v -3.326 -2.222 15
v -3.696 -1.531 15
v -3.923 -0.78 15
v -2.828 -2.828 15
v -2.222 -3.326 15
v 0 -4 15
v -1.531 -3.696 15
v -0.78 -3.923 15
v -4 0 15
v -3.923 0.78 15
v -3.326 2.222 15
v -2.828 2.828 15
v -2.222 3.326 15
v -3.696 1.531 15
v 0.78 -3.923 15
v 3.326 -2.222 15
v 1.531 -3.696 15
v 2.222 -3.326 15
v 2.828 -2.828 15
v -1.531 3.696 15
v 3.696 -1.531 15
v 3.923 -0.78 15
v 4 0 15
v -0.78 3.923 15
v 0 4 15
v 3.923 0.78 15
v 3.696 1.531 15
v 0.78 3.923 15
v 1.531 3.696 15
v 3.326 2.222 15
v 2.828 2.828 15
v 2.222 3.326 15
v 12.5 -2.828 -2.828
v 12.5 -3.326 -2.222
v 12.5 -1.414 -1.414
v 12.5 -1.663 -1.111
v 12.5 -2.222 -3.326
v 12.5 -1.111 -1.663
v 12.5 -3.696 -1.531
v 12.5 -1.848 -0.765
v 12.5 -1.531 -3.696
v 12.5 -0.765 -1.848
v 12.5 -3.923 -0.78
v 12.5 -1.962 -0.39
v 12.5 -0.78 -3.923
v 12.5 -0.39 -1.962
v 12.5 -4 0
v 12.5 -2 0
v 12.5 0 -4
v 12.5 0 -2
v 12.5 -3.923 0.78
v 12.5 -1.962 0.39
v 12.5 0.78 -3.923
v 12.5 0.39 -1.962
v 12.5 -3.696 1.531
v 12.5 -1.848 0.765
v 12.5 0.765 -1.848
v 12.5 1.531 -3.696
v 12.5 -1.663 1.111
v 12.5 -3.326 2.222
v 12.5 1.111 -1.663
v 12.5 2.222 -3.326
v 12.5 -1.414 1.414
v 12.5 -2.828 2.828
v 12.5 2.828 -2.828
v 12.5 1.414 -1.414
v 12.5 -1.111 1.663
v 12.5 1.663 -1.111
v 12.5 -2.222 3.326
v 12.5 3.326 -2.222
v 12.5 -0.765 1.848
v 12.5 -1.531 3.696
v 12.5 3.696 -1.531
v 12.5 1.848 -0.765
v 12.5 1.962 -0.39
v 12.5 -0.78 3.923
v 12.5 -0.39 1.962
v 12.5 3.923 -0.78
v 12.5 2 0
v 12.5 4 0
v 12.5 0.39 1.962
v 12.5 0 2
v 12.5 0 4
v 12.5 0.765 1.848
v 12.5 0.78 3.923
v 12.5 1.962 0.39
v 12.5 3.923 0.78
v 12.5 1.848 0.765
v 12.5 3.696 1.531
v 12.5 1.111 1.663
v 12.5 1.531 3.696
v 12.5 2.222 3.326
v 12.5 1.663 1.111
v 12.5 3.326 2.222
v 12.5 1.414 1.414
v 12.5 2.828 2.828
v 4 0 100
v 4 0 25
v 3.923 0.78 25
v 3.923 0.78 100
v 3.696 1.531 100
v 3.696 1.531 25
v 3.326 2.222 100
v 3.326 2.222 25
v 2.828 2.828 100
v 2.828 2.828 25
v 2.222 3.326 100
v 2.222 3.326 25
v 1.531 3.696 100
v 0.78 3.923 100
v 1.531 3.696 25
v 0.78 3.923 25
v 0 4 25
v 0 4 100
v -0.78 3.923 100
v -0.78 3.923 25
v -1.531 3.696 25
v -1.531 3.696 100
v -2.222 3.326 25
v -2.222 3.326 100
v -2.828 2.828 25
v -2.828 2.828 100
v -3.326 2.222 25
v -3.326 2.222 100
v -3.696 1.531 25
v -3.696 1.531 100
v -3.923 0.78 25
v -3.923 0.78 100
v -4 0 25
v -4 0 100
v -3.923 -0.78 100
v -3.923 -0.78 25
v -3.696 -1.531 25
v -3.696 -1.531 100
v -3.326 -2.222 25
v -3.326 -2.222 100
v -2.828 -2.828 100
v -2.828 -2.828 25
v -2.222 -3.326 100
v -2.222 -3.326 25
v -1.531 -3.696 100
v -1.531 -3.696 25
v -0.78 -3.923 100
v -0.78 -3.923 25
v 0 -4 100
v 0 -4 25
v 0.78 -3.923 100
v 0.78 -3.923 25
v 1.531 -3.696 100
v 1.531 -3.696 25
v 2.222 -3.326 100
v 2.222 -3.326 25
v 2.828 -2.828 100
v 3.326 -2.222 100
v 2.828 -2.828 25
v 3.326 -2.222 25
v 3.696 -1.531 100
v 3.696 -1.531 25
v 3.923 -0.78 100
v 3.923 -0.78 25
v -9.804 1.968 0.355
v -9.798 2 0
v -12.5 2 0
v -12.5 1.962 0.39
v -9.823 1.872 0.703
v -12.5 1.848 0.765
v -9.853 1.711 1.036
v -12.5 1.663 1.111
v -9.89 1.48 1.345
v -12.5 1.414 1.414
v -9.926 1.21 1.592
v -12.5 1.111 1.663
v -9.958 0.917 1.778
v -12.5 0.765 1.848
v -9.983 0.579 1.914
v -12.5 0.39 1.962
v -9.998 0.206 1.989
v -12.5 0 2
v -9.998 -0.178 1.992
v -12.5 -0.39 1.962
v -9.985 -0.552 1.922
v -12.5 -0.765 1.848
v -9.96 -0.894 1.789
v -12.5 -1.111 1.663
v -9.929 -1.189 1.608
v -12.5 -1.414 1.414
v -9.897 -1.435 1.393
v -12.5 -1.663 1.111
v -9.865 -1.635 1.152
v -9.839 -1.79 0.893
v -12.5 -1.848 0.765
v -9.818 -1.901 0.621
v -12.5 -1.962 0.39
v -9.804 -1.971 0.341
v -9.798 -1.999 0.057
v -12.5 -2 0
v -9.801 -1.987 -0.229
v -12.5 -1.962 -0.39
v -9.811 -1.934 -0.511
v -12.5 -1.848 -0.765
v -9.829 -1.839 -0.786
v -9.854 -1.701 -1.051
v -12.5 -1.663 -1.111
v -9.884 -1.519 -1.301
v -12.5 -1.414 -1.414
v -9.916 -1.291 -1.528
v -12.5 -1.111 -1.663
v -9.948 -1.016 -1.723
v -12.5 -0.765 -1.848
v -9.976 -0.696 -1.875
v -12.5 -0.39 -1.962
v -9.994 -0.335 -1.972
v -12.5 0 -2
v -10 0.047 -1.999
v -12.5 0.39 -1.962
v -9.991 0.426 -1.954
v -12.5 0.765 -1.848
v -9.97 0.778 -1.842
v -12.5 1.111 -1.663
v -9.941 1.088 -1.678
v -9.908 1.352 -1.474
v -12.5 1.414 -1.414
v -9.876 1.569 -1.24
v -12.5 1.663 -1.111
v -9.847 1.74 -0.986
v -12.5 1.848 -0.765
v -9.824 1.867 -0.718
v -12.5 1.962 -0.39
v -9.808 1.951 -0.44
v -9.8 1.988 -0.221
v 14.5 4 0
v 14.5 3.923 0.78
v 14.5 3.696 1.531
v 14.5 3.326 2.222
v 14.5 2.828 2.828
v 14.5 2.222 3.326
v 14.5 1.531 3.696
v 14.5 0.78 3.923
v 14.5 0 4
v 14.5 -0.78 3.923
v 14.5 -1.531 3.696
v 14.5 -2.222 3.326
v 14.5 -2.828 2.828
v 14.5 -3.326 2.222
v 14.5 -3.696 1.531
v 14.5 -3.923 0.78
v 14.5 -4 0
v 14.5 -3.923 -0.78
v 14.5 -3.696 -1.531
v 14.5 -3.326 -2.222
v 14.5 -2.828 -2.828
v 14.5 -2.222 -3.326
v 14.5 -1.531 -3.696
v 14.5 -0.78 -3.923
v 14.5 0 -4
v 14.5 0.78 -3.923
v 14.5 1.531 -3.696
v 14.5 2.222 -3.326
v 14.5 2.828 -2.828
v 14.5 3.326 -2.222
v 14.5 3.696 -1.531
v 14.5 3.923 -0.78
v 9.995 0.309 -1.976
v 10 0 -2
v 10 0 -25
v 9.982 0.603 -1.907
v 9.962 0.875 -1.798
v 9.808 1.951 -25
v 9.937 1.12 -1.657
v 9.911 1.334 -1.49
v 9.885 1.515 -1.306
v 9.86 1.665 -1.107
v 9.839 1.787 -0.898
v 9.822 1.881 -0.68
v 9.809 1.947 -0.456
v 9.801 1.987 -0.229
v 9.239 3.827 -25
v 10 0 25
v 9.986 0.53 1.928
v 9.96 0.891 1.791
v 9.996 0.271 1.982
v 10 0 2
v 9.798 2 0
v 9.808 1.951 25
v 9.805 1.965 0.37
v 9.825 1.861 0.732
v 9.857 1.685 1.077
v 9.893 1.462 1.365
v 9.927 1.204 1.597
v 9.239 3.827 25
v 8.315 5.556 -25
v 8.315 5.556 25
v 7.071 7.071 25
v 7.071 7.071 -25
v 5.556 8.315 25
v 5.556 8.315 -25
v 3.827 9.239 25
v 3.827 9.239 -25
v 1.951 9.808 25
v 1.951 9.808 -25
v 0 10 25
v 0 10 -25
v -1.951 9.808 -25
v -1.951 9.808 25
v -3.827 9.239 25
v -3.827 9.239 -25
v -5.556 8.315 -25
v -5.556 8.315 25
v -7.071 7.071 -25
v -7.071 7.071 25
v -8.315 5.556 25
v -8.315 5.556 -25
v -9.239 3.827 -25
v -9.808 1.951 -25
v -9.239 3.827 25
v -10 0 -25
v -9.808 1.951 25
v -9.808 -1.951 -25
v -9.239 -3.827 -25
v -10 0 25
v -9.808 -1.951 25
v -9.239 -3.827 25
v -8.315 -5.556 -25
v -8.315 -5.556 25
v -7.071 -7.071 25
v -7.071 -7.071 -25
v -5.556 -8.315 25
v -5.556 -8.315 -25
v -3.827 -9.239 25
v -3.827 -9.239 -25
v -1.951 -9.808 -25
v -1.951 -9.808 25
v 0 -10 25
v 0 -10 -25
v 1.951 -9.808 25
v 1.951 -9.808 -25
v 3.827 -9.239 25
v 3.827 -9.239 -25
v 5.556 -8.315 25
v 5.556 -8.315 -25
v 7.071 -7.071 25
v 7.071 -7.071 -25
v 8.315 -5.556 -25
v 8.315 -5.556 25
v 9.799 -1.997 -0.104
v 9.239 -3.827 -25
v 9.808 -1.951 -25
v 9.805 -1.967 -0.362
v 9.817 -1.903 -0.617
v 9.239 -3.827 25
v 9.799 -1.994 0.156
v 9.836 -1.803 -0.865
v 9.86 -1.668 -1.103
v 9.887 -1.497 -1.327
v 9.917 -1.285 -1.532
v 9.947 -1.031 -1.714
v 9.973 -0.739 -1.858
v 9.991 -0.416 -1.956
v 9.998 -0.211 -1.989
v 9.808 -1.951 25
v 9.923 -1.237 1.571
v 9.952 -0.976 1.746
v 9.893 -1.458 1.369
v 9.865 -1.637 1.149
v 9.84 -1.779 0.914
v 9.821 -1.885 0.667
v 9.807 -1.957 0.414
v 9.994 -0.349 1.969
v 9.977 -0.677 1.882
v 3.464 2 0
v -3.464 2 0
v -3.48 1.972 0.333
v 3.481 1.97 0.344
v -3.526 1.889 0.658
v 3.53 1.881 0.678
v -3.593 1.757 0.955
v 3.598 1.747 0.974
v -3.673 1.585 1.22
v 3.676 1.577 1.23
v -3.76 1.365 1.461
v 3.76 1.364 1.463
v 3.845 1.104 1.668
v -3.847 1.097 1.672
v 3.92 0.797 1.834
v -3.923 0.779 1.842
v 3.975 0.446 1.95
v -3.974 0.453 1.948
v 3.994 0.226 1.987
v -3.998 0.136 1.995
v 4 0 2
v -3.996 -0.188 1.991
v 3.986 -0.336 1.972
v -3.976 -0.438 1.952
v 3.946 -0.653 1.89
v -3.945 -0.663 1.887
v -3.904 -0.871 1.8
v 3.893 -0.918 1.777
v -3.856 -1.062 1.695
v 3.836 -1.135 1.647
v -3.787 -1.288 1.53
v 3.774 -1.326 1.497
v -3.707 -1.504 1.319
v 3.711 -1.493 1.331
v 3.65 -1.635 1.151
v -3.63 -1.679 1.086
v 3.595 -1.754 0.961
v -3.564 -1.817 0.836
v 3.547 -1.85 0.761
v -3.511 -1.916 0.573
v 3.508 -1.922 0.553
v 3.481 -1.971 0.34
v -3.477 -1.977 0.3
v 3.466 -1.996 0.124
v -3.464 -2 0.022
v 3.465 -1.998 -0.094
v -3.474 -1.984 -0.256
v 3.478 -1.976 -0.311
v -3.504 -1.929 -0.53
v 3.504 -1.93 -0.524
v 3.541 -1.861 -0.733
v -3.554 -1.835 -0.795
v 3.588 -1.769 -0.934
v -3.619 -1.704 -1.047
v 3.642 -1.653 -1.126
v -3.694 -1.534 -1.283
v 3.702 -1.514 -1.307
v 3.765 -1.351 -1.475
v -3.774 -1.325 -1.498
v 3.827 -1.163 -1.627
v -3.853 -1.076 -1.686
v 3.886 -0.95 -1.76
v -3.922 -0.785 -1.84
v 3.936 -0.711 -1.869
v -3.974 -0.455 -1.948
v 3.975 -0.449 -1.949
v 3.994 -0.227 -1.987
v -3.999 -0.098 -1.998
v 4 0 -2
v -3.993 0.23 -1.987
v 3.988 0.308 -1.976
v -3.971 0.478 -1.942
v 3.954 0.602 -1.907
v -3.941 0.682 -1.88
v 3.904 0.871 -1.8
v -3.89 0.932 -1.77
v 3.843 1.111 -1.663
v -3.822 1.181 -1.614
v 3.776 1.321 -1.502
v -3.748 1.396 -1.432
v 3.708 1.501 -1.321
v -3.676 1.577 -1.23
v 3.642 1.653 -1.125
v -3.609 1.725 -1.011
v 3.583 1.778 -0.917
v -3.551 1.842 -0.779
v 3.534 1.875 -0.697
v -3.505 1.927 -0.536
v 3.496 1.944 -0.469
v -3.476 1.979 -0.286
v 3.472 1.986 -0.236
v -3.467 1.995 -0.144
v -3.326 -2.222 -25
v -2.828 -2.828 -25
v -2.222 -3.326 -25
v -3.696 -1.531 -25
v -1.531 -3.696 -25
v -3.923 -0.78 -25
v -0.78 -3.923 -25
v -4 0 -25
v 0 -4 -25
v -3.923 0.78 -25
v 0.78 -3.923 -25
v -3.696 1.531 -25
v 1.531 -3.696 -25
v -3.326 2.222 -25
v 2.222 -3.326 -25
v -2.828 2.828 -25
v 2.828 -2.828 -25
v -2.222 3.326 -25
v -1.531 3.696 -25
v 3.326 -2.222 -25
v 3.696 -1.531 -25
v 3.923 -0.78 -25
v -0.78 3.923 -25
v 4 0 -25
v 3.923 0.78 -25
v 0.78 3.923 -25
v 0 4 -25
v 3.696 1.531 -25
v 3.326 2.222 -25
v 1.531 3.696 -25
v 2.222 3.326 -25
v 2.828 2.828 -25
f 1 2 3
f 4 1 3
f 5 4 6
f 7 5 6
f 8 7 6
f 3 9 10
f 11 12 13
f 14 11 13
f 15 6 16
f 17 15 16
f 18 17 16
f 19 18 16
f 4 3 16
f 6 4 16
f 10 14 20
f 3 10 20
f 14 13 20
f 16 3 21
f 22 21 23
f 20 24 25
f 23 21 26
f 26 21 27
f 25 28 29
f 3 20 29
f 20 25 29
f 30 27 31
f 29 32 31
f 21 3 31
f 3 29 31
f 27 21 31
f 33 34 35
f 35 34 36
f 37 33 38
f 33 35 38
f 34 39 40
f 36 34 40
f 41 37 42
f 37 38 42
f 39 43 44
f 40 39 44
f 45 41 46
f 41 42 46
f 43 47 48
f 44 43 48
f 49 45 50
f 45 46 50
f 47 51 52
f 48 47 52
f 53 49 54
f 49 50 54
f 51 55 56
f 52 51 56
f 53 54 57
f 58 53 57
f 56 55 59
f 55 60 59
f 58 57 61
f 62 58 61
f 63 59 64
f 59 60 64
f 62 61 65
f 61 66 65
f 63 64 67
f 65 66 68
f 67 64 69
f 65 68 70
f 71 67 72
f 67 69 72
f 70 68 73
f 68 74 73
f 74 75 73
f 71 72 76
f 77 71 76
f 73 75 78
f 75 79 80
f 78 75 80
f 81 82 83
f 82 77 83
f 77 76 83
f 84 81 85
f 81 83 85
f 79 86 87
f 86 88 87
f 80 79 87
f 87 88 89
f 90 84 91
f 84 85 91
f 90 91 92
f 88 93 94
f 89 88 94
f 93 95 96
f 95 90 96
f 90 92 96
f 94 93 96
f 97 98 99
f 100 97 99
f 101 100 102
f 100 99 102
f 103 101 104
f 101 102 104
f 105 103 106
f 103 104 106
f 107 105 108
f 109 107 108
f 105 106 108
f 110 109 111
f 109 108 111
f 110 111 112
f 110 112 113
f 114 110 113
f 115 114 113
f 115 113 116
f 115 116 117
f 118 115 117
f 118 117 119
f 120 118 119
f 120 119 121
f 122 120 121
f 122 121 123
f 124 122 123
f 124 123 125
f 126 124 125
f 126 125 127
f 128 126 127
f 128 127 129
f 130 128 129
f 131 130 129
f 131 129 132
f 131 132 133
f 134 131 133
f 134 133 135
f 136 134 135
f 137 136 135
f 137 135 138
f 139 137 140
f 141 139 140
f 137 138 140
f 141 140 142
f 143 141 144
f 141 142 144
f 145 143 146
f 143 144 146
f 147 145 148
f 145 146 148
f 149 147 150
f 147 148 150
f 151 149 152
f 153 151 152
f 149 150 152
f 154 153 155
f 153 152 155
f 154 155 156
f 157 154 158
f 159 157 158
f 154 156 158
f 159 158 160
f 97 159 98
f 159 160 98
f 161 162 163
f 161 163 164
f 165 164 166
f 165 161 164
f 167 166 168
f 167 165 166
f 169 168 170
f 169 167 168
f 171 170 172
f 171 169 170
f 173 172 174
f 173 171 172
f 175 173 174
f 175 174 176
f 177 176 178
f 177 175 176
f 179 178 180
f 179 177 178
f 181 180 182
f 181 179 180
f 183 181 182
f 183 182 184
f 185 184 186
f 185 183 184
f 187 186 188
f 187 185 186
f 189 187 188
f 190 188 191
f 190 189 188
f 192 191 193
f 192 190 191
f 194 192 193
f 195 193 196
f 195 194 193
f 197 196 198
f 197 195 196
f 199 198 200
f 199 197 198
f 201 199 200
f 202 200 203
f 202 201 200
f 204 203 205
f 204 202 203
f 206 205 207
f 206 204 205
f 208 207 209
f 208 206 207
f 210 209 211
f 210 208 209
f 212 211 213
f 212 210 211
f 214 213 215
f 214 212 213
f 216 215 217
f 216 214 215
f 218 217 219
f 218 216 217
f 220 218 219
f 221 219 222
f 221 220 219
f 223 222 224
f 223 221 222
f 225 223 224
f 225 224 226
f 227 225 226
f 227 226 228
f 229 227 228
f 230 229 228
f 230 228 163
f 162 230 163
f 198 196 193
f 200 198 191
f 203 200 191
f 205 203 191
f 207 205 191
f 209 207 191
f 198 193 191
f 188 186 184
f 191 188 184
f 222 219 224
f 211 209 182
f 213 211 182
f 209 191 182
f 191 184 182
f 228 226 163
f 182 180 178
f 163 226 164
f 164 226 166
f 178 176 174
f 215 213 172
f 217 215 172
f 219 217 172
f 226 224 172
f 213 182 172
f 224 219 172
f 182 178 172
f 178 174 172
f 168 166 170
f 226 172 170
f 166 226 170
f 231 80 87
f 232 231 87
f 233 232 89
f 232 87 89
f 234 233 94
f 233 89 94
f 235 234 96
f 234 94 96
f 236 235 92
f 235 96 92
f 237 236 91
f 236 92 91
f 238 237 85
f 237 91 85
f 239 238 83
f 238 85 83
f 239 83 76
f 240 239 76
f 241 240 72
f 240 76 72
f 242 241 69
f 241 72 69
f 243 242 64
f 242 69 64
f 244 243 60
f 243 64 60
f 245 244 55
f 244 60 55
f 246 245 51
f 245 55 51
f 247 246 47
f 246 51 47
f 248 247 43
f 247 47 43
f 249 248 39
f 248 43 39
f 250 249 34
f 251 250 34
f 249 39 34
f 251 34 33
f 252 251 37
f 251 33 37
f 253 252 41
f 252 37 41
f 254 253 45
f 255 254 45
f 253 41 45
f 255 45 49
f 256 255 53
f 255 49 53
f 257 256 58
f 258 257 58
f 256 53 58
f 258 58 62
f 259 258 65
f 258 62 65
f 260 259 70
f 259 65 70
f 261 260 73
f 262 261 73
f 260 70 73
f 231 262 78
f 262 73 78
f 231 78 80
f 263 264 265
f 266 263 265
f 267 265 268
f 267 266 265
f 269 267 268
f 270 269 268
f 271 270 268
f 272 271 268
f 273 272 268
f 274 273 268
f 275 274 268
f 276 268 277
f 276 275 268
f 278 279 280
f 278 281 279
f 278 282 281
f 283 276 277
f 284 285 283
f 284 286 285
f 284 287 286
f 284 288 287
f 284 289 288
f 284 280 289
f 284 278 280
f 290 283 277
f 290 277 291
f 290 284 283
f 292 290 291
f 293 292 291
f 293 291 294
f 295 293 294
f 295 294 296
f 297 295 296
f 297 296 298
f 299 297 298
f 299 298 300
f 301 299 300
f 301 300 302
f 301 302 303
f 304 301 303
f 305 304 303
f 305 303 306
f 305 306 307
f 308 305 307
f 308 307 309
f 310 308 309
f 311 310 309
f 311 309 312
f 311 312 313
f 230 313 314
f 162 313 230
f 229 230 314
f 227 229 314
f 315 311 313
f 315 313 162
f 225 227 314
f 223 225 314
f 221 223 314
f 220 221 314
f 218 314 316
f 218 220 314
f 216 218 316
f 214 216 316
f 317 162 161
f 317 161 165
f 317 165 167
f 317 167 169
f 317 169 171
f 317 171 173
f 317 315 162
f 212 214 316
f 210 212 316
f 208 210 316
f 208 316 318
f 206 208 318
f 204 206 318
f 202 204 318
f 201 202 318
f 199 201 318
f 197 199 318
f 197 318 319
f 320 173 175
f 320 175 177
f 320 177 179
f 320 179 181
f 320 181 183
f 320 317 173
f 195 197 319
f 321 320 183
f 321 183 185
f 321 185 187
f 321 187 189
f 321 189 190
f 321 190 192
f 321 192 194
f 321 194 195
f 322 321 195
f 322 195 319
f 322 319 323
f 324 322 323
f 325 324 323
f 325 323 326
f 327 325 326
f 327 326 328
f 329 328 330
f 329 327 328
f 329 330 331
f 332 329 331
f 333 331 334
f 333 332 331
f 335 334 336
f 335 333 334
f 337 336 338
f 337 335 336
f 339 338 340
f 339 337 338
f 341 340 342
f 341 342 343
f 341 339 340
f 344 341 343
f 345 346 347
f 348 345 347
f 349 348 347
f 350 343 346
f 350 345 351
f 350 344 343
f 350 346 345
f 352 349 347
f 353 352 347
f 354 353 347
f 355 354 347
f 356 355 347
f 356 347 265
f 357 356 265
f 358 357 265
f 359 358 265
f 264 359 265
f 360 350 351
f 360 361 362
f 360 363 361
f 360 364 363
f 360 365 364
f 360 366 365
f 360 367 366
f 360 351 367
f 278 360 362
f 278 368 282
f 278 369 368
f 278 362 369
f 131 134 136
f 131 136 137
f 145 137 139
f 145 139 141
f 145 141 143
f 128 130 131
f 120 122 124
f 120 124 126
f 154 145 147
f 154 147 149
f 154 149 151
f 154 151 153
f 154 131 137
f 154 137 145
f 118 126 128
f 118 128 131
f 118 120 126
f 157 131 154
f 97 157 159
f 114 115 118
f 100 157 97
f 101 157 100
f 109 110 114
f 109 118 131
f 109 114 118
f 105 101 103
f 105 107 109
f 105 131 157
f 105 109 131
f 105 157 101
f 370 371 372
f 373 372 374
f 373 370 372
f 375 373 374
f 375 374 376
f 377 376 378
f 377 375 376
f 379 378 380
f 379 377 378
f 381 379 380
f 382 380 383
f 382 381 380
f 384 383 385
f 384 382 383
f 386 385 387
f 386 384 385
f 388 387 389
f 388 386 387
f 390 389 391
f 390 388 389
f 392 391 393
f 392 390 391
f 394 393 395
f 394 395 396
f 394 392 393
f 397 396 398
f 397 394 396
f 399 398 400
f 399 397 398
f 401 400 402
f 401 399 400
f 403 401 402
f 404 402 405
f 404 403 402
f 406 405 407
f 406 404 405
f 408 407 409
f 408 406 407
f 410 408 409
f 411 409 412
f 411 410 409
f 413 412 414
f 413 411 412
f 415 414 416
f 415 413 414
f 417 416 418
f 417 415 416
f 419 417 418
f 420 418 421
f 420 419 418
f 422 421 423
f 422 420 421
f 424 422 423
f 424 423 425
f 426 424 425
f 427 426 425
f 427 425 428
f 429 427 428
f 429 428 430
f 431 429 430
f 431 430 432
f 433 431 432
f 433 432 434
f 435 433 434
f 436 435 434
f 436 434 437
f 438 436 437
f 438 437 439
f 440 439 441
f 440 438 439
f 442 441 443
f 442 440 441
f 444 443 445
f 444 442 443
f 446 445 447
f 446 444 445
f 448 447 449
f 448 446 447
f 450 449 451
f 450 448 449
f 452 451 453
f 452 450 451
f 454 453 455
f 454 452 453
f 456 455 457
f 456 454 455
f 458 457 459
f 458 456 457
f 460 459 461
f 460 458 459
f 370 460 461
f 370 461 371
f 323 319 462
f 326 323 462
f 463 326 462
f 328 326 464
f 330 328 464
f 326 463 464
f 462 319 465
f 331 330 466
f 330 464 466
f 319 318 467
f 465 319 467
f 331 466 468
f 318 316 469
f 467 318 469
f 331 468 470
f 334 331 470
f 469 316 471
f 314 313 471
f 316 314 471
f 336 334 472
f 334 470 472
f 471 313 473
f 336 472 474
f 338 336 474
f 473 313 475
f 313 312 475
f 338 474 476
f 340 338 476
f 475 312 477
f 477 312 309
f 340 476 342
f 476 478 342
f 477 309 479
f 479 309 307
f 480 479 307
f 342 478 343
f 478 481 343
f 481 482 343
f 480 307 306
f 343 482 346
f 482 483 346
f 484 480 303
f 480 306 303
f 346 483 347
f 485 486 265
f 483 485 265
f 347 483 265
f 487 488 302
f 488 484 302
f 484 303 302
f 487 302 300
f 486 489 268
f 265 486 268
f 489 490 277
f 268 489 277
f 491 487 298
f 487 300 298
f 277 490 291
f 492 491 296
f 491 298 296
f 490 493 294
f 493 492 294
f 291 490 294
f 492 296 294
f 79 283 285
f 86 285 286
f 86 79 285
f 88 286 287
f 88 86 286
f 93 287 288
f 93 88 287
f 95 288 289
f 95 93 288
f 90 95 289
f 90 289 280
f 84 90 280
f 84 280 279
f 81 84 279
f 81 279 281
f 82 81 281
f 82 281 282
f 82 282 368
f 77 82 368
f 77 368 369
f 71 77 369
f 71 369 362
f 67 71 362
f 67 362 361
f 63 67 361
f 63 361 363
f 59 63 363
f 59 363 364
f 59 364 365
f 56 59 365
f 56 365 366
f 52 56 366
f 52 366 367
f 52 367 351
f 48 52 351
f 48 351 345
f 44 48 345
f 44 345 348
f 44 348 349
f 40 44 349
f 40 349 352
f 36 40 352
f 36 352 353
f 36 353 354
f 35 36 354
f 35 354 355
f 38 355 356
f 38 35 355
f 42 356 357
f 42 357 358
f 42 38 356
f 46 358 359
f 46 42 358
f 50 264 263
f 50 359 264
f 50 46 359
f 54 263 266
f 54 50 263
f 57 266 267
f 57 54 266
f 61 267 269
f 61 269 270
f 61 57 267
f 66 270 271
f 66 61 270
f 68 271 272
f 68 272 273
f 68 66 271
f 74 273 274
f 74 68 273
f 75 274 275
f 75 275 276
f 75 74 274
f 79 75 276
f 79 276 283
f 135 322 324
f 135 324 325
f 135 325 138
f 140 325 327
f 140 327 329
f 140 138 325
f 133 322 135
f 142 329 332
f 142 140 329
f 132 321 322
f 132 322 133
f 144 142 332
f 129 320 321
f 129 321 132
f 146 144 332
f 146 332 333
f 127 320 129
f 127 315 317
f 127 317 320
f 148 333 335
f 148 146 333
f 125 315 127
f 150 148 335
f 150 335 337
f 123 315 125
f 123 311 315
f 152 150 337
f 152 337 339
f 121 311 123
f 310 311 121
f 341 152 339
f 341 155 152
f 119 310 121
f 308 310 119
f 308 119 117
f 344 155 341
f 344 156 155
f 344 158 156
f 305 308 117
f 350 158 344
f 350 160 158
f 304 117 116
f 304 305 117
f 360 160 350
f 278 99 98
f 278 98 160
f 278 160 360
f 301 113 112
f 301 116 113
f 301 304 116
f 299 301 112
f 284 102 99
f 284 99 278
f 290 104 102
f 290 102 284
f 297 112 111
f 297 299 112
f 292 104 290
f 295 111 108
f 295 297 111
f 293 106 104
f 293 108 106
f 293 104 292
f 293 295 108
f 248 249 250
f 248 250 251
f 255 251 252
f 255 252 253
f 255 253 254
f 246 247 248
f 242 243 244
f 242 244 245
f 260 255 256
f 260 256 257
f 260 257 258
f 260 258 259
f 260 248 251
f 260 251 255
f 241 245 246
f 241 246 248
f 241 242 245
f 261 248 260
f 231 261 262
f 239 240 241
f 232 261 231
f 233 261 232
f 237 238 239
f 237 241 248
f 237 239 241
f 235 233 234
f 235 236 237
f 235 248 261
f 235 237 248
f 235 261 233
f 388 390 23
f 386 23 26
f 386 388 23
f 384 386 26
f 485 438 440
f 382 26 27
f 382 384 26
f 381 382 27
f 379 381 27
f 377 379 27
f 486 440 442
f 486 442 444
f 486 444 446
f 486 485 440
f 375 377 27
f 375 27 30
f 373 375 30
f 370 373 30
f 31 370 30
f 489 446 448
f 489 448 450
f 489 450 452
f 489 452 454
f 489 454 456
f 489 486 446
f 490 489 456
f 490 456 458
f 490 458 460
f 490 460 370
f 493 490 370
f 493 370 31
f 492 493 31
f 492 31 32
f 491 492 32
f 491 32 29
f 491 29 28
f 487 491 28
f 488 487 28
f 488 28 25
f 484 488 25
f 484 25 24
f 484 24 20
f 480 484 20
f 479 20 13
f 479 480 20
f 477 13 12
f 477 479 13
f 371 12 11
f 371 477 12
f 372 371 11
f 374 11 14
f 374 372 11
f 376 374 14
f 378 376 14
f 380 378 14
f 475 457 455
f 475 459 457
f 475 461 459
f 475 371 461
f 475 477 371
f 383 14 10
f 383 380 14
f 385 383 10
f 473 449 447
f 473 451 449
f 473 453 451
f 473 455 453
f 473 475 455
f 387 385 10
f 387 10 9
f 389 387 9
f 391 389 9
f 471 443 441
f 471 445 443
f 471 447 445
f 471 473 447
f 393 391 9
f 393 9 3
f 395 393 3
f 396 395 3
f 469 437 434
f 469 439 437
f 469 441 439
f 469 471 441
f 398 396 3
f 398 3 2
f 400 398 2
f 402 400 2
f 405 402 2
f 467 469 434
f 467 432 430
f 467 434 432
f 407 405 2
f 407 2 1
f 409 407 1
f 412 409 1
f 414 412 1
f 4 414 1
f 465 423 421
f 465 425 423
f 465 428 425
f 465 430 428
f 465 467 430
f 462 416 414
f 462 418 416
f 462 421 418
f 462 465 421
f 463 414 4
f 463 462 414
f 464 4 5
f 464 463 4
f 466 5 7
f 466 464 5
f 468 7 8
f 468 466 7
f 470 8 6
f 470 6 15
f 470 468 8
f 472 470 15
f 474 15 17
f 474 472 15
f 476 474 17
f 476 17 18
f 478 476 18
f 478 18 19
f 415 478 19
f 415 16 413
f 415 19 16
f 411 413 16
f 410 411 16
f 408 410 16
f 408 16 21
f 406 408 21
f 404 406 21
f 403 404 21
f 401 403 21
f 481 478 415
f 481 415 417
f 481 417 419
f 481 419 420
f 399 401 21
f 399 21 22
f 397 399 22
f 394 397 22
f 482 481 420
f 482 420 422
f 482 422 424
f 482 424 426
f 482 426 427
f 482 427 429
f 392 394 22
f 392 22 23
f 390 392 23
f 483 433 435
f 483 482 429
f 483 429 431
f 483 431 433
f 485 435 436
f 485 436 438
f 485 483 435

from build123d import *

# Parameters (mm, degrees)
F0_R     = 10
F0_R_2   = 4
F1_DEPTH = 25
F2_R     = 2
F3_DEPTH = 12.5
F5_START = 12.5
F4_R     = 4
F5_DEPTH = 2
F7_START = 15
F6_R     = 4
F7_DEPTH = 85


with BuildPart() as f1:
    # F0 (on Top) → F1 (new body, symmetric)
    with BuildSketch(Plane.XY):
        Circle(F0_R)
        Circle(F0_R_2, mode=Mode.SUBTRACT)
    extrude(amount=F1_DEPTH, both=True)

    # F2 (on Right) → F3 (join, symmetric)
    with BuildSketch(Plane.YZ):
        Circle(F2_R)
    extrude(amount=F3_DEPTH, both=True)

    # F4 (on Right) → F5 (join)
    with BuildSketch(Plane.YZ.offset(F5_START)):
        Circle(F4_R)
    extrude(amount=F5_DEPTH)

    # F6 (on Top) → F7 (join)
    with BuildSketch(Plane.XY.offset(F7_START)):
        Circle(F6_R)
    extrude(amount=F7_DEPTH)


solid = f1.part
